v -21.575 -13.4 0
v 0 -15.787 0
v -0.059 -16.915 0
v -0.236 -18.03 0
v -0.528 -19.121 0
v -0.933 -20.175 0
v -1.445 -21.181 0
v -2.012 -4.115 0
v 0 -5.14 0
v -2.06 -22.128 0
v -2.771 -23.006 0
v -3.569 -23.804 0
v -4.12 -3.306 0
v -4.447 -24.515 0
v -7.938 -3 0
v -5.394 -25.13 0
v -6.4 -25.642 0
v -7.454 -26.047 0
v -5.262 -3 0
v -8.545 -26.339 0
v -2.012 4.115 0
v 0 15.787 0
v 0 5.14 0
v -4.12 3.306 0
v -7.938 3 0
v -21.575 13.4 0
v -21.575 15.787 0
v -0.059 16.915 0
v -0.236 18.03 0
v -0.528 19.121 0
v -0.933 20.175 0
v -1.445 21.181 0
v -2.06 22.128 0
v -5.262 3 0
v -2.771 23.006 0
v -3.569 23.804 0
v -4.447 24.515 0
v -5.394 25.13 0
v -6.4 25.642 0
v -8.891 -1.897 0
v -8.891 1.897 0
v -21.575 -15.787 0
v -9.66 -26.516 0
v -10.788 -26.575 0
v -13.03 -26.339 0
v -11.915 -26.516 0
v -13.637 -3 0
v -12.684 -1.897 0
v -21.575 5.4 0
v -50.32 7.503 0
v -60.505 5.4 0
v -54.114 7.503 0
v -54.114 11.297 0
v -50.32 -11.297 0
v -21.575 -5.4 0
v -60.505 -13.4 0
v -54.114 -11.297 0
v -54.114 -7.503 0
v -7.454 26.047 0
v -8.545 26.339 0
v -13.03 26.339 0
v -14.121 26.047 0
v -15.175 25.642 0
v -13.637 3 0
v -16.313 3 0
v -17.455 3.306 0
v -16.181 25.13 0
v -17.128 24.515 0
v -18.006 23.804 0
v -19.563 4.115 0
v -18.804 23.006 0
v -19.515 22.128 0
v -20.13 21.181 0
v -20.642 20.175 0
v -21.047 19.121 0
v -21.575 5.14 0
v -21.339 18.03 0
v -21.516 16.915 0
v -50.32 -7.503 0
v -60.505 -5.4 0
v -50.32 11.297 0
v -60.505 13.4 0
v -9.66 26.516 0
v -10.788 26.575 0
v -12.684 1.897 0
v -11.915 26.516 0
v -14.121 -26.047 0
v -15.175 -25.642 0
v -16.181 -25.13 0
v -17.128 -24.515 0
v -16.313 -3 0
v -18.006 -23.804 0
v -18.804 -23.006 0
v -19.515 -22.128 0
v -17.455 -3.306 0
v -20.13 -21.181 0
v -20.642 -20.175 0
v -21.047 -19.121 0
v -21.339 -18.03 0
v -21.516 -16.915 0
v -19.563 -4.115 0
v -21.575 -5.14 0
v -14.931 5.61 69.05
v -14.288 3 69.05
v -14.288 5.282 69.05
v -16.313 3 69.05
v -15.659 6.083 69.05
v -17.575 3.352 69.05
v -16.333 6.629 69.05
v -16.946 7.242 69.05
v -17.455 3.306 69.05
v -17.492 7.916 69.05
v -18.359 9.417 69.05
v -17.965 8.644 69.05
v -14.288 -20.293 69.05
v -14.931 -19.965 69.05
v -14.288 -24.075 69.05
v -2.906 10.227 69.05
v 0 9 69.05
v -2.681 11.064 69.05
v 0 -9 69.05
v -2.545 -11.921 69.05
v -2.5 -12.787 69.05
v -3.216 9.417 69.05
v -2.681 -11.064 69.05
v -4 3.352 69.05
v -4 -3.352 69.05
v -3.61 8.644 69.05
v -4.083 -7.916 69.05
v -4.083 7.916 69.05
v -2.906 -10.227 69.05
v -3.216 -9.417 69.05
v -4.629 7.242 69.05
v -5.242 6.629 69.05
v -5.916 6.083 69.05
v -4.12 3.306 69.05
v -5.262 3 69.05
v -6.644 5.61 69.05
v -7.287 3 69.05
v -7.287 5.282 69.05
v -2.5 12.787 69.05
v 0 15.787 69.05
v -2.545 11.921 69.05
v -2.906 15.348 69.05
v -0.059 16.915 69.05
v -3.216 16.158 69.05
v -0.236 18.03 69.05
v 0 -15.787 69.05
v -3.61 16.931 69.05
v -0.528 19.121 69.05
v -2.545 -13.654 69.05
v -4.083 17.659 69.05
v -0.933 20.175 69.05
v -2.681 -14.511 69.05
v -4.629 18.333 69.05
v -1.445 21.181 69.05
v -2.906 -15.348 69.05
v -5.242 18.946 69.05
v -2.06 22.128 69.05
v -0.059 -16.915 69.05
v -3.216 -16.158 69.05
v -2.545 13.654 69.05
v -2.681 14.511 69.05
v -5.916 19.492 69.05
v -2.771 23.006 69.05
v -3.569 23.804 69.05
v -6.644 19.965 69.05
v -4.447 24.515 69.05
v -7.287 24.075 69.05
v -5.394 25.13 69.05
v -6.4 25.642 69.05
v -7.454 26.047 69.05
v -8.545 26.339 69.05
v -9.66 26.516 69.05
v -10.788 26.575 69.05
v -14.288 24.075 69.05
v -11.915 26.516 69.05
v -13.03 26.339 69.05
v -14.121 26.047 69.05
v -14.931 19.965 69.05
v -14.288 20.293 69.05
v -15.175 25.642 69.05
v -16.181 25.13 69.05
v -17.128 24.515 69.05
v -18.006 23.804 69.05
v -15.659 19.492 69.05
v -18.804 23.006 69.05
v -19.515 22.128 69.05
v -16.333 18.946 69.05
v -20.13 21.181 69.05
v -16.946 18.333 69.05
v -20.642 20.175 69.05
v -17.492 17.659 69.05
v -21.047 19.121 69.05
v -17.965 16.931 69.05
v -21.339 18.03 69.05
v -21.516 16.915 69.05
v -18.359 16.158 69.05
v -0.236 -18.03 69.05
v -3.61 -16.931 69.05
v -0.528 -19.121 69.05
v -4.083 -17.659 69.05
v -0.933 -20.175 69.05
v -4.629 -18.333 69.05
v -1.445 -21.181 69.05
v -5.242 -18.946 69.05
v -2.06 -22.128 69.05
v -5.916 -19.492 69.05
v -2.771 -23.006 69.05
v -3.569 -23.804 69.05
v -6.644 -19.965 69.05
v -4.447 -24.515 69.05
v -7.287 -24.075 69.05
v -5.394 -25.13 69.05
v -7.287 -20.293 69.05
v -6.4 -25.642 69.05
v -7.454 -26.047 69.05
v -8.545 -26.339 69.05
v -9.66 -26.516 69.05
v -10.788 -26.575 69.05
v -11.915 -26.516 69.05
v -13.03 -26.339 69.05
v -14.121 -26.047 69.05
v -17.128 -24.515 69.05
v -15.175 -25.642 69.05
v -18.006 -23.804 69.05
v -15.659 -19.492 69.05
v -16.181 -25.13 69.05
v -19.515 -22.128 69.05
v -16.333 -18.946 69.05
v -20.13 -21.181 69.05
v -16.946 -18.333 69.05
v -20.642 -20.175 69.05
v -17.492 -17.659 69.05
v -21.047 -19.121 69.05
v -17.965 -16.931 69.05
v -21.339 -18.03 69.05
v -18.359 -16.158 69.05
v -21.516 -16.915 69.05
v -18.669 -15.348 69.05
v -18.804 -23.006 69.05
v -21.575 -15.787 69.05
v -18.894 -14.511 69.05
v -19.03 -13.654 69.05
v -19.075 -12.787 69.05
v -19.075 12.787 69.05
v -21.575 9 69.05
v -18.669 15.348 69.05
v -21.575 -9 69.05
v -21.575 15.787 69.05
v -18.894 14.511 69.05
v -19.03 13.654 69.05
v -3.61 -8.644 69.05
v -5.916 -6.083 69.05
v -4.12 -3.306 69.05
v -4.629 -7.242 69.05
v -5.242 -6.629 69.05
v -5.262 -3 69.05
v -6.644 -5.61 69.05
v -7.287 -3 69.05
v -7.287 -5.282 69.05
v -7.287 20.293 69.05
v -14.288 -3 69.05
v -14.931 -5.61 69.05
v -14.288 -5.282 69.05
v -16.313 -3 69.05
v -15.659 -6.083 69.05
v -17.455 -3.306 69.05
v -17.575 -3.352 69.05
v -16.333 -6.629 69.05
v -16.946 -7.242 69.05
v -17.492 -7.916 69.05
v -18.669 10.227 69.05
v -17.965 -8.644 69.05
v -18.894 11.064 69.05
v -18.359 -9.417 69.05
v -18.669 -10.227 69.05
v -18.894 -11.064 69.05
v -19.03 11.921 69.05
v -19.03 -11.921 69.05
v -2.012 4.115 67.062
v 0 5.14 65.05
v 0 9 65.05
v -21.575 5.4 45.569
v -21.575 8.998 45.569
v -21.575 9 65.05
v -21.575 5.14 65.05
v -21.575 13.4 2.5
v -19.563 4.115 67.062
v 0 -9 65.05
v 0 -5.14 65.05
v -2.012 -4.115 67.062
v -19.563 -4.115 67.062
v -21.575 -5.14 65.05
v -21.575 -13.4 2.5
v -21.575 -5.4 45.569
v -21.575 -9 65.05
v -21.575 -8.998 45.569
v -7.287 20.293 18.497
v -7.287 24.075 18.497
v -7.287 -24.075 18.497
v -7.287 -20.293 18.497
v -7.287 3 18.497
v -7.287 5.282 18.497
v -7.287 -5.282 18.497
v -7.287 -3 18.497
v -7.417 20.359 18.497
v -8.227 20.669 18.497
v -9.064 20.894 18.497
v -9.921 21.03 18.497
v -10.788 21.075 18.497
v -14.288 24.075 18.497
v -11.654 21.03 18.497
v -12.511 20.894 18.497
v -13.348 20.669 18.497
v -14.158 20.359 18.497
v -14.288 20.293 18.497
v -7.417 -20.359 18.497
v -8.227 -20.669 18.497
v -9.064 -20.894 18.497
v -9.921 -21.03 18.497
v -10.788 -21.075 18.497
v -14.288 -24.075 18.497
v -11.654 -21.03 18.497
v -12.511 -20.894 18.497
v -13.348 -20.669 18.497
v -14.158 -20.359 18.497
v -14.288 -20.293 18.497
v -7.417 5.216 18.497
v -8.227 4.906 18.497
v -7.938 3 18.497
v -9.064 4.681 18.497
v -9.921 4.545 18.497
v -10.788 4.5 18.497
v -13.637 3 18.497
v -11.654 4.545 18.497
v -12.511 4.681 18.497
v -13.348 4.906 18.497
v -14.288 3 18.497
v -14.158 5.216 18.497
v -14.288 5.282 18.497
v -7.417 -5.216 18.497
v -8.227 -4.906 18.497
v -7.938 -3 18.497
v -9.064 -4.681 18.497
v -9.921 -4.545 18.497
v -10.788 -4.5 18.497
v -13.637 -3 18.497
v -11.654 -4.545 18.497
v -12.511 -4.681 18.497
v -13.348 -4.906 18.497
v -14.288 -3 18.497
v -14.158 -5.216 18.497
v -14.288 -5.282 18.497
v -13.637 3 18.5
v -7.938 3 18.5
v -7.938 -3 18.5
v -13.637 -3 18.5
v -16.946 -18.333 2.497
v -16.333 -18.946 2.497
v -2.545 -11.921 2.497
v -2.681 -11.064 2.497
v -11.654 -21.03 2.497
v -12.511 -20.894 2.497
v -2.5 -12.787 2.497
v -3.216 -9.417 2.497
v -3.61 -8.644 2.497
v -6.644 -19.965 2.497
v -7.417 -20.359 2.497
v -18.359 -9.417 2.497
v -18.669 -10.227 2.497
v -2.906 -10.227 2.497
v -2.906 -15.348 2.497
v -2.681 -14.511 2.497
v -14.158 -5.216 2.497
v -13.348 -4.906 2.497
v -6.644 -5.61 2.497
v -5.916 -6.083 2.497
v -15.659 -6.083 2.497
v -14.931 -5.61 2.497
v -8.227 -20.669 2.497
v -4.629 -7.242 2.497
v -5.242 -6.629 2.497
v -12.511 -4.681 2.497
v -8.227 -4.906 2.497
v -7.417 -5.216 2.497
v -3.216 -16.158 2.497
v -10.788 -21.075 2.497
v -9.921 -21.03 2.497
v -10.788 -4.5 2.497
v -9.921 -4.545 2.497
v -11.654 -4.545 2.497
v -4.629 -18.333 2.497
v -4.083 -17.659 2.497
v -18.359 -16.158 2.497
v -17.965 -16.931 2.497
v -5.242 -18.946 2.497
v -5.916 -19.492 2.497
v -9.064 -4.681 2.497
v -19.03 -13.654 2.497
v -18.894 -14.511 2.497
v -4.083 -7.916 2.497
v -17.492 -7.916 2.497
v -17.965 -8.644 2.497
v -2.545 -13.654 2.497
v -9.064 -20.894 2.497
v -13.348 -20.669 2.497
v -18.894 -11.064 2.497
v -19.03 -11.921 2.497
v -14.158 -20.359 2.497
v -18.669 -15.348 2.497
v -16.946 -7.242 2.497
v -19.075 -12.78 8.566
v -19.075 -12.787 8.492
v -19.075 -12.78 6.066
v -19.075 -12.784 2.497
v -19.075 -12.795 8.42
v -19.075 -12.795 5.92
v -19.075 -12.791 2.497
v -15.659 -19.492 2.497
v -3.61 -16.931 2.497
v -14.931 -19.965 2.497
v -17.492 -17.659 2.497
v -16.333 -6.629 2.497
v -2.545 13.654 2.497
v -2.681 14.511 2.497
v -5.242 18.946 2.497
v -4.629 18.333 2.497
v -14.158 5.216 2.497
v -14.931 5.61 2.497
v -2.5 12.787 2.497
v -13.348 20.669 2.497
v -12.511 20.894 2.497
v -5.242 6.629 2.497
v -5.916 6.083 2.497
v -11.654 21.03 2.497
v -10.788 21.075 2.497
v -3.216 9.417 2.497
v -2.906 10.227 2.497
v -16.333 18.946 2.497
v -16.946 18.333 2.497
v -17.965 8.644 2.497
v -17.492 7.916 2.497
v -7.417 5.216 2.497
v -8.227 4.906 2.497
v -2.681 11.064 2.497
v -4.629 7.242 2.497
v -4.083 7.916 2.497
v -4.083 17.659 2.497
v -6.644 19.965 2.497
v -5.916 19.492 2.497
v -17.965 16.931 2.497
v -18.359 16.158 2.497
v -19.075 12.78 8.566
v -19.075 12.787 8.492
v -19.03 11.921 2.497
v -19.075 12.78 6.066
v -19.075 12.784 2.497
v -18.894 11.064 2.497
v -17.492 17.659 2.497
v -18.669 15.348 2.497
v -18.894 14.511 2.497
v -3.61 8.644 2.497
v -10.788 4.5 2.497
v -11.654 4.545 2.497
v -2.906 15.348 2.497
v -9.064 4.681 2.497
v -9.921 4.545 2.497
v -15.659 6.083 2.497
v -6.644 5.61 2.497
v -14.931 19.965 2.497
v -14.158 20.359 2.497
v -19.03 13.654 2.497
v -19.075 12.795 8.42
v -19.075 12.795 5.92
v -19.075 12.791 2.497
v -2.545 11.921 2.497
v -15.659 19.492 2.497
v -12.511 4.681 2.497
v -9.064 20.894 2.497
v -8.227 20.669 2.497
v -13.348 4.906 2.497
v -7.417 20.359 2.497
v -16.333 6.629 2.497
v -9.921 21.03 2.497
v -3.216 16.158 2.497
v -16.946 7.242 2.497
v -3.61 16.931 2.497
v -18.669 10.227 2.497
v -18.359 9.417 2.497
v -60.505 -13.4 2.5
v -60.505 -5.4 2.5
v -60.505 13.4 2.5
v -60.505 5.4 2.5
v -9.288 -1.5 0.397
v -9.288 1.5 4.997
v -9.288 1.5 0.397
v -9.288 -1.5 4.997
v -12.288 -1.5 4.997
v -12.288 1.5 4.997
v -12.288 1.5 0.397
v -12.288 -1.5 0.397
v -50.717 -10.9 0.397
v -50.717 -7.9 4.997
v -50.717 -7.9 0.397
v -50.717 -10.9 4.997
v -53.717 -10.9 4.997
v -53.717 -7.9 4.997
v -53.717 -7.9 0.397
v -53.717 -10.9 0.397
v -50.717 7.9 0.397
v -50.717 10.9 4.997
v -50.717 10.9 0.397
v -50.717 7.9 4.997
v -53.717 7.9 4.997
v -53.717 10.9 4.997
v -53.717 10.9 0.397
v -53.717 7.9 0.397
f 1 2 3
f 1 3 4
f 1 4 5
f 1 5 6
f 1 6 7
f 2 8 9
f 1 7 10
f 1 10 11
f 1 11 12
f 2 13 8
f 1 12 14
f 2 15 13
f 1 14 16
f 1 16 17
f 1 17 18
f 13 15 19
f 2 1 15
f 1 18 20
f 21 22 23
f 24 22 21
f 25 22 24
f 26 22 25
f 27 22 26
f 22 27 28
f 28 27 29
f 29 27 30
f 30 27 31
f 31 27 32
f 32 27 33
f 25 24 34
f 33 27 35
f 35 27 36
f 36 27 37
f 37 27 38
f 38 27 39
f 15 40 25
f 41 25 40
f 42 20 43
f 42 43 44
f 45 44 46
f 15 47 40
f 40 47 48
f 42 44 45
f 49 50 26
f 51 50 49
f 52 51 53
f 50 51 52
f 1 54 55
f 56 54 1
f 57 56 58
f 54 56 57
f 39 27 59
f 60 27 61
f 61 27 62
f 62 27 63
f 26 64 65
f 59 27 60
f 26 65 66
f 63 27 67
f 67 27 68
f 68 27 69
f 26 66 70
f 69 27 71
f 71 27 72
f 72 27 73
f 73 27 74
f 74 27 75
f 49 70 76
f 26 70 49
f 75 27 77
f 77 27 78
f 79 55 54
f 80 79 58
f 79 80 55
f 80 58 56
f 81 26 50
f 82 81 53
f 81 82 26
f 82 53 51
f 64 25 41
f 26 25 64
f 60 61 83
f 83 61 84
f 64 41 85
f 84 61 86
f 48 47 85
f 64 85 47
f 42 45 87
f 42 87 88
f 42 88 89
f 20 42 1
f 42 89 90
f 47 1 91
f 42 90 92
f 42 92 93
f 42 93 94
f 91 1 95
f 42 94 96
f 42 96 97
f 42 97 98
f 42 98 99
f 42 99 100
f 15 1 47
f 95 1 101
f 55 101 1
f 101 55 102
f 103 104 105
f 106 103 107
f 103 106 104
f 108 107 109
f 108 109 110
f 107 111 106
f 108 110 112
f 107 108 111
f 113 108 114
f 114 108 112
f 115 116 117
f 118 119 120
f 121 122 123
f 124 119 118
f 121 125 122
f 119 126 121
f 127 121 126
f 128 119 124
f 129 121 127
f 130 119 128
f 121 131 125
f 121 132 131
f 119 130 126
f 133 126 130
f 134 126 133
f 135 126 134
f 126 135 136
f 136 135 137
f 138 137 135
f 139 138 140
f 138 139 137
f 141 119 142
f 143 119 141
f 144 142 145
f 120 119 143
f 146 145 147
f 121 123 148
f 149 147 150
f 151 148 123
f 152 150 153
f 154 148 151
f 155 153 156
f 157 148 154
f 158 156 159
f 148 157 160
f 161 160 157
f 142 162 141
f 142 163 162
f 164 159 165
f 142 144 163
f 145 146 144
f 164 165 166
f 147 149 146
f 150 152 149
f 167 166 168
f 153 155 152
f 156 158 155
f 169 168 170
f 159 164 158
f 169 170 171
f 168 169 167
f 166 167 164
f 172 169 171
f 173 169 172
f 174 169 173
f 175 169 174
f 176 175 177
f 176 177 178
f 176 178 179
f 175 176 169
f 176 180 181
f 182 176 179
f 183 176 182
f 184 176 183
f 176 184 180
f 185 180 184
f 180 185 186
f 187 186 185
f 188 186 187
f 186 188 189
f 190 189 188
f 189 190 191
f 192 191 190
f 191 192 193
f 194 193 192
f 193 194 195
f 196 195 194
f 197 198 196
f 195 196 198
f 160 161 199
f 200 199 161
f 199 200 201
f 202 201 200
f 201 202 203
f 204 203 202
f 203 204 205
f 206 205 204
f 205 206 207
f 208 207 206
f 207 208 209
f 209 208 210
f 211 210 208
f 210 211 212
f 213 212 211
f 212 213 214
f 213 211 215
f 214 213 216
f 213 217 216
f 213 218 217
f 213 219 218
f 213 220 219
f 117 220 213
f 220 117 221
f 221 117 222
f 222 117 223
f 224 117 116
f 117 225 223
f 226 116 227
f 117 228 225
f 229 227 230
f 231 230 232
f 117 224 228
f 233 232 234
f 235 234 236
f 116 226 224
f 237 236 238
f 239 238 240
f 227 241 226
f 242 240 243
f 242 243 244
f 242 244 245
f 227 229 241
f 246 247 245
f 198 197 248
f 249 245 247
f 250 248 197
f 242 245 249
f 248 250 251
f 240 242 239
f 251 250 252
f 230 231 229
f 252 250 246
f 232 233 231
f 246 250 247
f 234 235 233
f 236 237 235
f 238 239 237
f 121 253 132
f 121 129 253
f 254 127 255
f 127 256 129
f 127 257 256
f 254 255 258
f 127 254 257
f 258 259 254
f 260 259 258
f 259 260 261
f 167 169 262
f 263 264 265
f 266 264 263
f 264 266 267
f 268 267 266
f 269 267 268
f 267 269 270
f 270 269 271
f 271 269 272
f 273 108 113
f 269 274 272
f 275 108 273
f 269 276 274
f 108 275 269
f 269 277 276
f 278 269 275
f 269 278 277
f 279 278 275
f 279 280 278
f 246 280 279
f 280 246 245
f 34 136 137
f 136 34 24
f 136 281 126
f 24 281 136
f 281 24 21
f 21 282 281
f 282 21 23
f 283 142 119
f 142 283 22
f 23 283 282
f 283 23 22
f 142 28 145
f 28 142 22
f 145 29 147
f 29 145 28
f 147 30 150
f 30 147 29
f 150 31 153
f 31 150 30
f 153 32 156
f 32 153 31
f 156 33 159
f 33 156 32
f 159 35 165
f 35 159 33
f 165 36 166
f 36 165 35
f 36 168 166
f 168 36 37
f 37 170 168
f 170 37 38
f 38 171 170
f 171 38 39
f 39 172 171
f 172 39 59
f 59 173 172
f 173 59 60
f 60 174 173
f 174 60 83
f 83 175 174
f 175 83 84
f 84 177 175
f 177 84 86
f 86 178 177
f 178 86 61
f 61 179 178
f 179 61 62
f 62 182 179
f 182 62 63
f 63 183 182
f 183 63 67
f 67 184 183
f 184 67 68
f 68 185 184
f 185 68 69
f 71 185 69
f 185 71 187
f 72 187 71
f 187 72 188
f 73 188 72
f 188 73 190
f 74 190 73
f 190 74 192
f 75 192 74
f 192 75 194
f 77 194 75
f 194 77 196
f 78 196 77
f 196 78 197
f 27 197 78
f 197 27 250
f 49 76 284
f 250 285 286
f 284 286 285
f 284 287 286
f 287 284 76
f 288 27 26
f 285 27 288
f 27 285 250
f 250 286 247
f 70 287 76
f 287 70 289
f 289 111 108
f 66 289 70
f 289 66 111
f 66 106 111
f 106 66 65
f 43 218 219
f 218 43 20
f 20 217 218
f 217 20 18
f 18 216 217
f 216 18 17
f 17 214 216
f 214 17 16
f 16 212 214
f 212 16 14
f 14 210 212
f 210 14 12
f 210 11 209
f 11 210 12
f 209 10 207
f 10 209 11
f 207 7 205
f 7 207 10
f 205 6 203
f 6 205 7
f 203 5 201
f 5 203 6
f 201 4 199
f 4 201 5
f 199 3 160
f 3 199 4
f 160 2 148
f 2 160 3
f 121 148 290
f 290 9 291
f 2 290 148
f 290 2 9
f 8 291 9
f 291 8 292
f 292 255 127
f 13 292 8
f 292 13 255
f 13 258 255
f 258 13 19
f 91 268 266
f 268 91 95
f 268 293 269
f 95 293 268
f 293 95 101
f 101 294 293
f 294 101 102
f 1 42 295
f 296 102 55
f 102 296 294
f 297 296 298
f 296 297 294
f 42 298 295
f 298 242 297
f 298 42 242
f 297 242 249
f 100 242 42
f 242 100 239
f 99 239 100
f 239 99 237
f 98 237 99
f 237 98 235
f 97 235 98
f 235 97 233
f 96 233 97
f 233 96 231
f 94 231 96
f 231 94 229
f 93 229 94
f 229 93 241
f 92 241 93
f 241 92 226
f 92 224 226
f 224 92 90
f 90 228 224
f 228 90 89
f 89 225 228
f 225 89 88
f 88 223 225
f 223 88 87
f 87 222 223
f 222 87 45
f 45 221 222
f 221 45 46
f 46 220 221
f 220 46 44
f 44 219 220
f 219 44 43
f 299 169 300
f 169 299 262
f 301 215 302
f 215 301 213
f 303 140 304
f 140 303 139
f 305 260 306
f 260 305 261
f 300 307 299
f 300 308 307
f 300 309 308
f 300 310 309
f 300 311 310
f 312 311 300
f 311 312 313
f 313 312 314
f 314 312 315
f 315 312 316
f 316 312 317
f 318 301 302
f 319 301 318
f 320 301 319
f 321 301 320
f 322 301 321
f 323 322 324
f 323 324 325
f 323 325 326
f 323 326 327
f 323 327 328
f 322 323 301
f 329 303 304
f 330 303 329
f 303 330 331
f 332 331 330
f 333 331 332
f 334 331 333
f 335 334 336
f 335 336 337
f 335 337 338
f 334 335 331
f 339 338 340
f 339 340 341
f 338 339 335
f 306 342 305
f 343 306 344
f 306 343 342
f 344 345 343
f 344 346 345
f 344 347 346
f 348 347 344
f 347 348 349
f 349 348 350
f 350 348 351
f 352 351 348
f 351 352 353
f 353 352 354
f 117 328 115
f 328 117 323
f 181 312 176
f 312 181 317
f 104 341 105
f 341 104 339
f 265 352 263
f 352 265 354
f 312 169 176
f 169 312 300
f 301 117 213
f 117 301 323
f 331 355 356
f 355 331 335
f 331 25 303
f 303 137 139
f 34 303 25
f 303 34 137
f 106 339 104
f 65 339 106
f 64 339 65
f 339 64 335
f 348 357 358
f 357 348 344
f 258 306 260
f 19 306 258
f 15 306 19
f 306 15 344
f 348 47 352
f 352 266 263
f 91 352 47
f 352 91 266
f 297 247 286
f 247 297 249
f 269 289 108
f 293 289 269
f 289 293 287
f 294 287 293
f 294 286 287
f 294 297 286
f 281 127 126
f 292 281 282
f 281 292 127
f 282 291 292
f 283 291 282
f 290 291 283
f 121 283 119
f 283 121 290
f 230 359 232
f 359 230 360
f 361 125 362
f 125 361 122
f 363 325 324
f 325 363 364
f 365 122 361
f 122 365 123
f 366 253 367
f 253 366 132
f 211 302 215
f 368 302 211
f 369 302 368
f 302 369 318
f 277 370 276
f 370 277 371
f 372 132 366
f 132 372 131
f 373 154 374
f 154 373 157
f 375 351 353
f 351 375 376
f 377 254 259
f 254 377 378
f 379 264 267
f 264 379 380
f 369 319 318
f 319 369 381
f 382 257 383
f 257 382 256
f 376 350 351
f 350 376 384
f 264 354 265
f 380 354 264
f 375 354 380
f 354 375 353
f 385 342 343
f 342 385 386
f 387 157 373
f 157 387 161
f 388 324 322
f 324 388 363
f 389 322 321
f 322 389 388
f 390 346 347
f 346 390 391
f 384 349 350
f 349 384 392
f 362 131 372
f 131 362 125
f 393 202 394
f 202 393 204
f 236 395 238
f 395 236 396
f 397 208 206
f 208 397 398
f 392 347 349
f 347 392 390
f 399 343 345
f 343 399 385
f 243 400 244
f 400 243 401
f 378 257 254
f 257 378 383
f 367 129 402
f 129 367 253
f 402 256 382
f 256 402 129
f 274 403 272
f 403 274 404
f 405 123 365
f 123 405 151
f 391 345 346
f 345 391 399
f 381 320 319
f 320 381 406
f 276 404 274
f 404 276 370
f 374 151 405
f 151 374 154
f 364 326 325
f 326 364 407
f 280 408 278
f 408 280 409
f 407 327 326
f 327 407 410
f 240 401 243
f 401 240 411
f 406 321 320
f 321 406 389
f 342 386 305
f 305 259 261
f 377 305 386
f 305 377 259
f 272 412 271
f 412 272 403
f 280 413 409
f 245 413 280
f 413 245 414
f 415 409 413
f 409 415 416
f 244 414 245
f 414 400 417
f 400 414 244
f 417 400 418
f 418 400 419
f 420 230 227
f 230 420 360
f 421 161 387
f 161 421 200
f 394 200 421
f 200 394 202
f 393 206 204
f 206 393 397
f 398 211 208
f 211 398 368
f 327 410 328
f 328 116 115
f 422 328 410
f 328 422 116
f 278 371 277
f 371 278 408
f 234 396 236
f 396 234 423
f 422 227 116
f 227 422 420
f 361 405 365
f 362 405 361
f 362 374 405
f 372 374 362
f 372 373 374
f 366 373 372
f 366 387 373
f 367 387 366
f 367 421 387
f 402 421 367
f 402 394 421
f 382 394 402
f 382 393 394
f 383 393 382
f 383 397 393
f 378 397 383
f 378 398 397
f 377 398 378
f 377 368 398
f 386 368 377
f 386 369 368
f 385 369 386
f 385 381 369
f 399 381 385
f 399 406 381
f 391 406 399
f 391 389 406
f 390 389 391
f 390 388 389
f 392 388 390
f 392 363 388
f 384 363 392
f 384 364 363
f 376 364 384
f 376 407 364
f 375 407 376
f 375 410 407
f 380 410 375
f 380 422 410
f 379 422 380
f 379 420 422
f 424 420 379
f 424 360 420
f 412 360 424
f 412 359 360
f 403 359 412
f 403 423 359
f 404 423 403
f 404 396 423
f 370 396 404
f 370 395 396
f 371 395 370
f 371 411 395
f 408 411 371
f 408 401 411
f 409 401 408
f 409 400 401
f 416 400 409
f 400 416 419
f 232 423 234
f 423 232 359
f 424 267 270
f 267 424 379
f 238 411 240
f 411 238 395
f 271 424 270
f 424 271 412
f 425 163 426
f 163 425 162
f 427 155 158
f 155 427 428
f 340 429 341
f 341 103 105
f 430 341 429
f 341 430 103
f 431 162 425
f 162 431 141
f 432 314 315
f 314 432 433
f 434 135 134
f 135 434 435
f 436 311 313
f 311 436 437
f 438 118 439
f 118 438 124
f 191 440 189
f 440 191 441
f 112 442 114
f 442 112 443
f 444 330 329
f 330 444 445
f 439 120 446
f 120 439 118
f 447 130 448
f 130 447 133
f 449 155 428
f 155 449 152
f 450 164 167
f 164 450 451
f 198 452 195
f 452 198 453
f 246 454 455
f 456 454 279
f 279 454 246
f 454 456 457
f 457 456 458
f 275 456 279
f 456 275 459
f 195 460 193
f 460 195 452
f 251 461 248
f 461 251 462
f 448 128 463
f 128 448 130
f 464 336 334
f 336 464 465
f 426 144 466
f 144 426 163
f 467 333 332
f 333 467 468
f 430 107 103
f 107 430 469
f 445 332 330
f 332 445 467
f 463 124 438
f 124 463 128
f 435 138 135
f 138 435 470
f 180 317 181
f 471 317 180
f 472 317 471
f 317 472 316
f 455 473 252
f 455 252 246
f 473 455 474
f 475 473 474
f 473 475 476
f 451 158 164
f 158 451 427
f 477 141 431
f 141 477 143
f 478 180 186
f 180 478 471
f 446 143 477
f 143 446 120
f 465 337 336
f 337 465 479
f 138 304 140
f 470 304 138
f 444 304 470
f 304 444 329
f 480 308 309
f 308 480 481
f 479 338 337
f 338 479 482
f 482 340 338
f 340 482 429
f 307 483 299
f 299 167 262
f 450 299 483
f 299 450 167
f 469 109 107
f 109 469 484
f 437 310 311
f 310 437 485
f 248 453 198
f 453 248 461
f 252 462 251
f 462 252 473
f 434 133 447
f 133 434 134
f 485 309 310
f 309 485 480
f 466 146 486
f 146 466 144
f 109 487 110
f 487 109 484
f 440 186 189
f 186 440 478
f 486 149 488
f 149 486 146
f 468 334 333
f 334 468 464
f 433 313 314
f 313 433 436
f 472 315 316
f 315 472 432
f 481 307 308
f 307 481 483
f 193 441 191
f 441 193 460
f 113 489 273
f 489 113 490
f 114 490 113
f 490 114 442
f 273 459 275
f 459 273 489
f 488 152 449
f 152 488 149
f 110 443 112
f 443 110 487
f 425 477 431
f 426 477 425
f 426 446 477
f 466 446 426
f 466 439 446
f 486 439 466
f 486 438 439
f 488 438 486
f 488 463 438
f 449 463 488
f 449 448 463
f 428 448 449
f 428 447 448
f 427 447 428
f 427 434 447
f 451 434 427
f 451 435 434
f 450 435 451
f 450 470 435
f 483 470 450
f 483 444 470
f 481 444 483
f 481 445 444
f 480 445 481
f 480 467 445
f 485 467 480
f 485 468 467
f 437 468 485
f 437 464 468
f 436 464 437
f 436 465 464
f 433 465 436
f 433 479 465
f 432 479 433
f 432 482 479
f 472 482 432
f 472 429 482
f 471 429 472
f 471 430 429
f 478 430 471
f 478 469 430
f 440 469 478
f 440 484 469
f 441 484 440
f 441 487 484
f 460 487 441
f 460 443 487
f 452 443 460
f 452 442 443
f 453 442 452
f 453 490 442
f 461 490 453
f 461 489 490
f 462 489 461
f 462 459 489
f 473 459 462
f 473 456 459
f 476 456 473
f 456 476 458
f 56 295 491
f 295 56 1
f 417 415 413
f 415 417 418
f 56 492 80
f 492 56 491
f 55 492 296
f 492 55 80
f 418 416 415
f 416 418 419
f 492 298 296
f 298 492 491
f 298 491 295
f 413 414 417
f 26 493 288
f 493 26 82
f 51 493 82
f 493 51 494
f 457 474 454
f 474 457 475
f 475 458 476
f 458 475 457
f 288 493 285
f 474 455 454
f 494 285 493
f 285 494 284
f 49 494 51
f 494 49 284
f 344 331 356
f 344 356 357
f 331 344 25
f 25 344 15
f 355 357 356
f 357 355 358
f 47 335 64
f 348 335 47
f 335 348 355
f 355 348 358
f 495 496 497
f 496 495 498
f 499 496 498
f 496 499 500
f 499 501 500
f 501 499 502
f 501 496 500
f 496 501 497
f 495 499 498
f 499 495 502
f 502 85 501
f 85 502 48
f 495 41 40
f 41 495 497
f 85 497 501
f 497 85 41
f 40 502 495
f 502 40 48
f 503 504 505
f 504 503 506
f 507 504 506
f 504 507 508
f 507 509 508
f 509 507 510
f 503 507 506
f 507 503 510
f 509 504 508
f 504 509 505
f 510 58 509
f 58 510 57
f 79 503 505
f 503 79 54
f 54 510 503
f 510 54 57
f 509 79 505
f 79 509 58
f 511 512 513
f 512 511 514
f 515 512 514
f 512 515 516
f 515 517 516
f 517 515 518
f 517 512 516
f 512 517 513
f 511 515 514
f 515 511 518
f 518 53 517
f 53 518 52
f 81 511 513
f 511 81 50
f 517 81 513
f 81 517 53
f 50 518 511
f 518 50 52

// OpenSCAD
// file: ../morph.scad
// Utilities for composing smooth solids from a list of cross-sections.

// Searches over a list of key/value pairs (sorted by key), returning
// the index of the pair with the largest key less than or equal to 'target'.
function _binsearch(target, pairs) = (
  _binsearch_impl(target, pairs, 0, len(pairs))
);
function _binsearch_impl(target, pairs, lo, hi) = (
  // Base case.
  hi == lo + 1 ? lo :
  // Recursive case.
  let (mid = floor((hi + lo) / 2))
  pairs[mid][0] <= target
  ? _binsearch_impl(target, pairs, mid, hi)
  : _binsearch_impl(target, pairs, lo, mid)
);

// Filters out slices which do not affect the resulting solid.
function _filter(slices) = (
  assert(len(slices) > 0, "No slices")
  let (last = len(slices)-1)
  [
    for (i = [0 : last]) if (
      // Always keep the start and end.
      i == 0 ||
      i == last ||
      // Keep interior slices only if they are not bordered on both sides by
      // identical slices.
      slices[i-1][1] != slices[i][1] ||
      slices[i+1][1] != slices[i][1]
    ) slices[i]
  ]
);
  
// Each element of 'slices' is a pair giving a Z-coordinate and a payload
// list of values. The result is a similar list with Z-coordinates spaced
// apart by $zstep and the payload values interpolated.
function _reslice(slices) = (
  assert(len(slices) > 0, "No slices")
  let (
    last = len(slices)-1,
    minz = slices[0][0],
    maxz = slices[last][0]
  )
  [
    for (z = [minz : $zstep : maxz]) (
      // Edge cases: No interpolation.
      z == minz ? [z, slices[0][1]] :
      z == maxz ? [z, slices[last][1]] :
    
      // Load the two bounding points between which to interpolate.
      let (
        lo = _binsearch(z, slices),
    
        lower_z = slices[lo][0],
        lower_payload = slices[lo][1],
        upper_z = slices[lo+1][0],
        upper_payload = slices[lo+1][1],
    
        // Interpolation ratio.
        r = (z - lower_z) / (upper_z - lower_z)
      )
      [z, upper_payload*r + lower_payload*(1-r)]
    )
  ]
);

// Interpolates between several slices in the z dimension. Each element of
// 'slices' is a pair giving a Z-coordinate and a payload list of values.
// $zstep determines the resolution. The children are expected to be 2-D.
// They are evaluated repeatedly to produces the slices of the morphed
// solid. Each time the children are evaluated, $m will contain an interpolated
// slice.
module morph(slices) {
  layers = _filter(_reslice(slices));
    
  // We intentionally throw out the last slice. Otherwise we would extrude
  // one zstep beyond the desired dimensions.
  last = len(layers)-2;
  
  for (i = [0 : last]) {
    z = layers[i][0];
    height = layers[i+1][0] - z;
    translate([0, 0, z]) {
      // Add 1% to make sure all of the layers actually overlap.
      linear_extrude(height * 1.01) {
        $m = layers[i][1];
        children();
      }
    }
  }
}

// A utility for generating slices to be passed to morph. This allows the
// z-coordinate to be used as one of the interpolated elements.
function dupfirst(slices) = [
  for (s = slices) [s[0], s]
];
// file: ../grip.scad
use <morph.scad>

module grip() {
  height = 94;
  
  difference() {
    translate([0, 13, 1-height]) {
      // Fields:
      //   height
      //   front circle radius
      //   back circle radius
      //   back circle offset
      morph(dupfirst([
        // Round out the back corner.
        [0,   13,  -4],
        [3,   13,  -2.5],
        [6,   13,  -2],
        [9,   13,  -1.5],
        // Swell out in back.
        [11,  13,  -1],
        [23,  14,  0],
        [41,  14,  0],
        [57,  12, -1],
        // Divot in back for thumb and finger.
        [62,  12, -2.5],
        [67,  12, -4],
        [72,  12, -5],
        [77,  12, -5],
        [79.5,12, -4],
        [82,  12, -2],
        [84.5,12,  1],
        [87,  12,  5],
        [91,  11,  14],
        [94,  11,  15],
      ])) {
        hull() {
          z = $m[0];
          forward =
            // No tilt up to 8mm. Slight tilt from there to 13mm.
            max(0, z-8)*0.2 +
            // Full 18 degree tilt after 13mm.
            max(0, z-13)*0.133333 -
            // No tilt for top 1mm, which joins to receiver
            max(0, z-93)*0.333333;
          
          // Bottom, chamfered in slightly.
          inset = max(0, 1-z);

          translate([0, forward, 0]) {
            translate([0, 16, 0]) circle(12-inset);
            translate([0, -14-$m[2], 0]) circle($m[1]-inset);
          }
        }
      }
    }
  
    // Divots for thumb and index finger.
    for (a = [-1, 1])
      scale([a, 1, 1])
        translate([-22, 52, -15])
          scale([1, 3, 1])
            sphere(12);
  }
}

grip();
// file: common.scad
$fa = 6;
$fs = 0.2;
eps = 0.003;

// Use a larger value for faster rendering.
$zstep = 0.2;

// An inward chamfer sufficient to prevent elephant's foot.
foot = 0.4;

// FINDINGS FROM CLEARANCE TEST
//
// Consider a vertical hole of width X, a layer height of 0.2, and a vertical
// post.
//   * A post of diameter X will not fit in.
//   * A post of diameter X-0.1 will fit in, but is very hard to slide in or out.
//     This is probably due mostly to the transverse grain of the print.
//     It will rotate, but with some resistance.
//   * A post of diameter X-0.2 slides in and out easily. It rotates easily, but
//     still has noticeable resistance at some points.
//   * A post of diameter X-0.3 rotates freely. It also has noticeable play
//     from side to side.
//
// Clearances are expressed as the total across both sides of a joint.
tight = 0.1;  // Intended for stationary joints.
snug = 0.2;   // Moves, but with some resistance.
loose = 0.3;  // Free movement.
extra_loose = 0.4;

// A brim is a 0.2mm layer printed near an edge which is likely to warp.
// The edge should be chamfered outwards at 45 degrees. The brim should
// be placed this far from the bottom of the edge, so it barely touches
// the chamfer.
brim_offset = 0.3;

// Menards 5/8 x 2-3/4 x 0.04 WG compression spring.
spring_od = 5/8 * 25.4;
// Subtract 10 from the relaxed length so everything is slightly tensioned
// all the time.
spring_max_length = 2.75 * 25.4 - 10;
spring_min_length = 16;  // Approximate.

// Menards 1/4 inch aluminum rod.
roller_diameter = 6.7;
roller_cavity_diameter = roller_diameter + loose;

// 550 paracord.
string_diameter = 4;

// Standard spring tube.
tube_id = spring_od + 0.7;

module octagon(diameter) {
  intersection_for(a = [0, 45])
    rotate([0, 0, a])
      square(diameter, center=true);
}

// A cylinder with a chamfered or flared bottom end, useful for dealing
// with elephant's foot on pins or holes.
module flare_cylinder(height, radius, flare) {
  translate([0, 0, abs(flare)-eps])
    cylinder(height-abs(flare)+eps, radius, radius);

  linear_extrude(abs(flare), scale=radius/(radius-flare))
    circle(radius-flare);
}

// A cube with a chamfered or flared bottom end, useful for dealing
// with elephant's foot on pins or holes.
module flare_cube(dims, flare) {
  translate([0, 0, abs(flare)-eps])
    cube([dims.x, dims.y, dims.z - abs(flare) + eps]);

  translate([dims.x/2, dims.y/2, 0])
    linear_extrude(abs(flare), scale=[dims.x/(dims.x-2*flare), dims.y/(dims.y-2*flare)])
      translate([-(dims.x-2*flare)/2, -(dims.y-2*flare)/2, abs(flare)-eps])
        square([dims.x-2*flare, dims.y-2*flare]);
}

// An approximate circle which can be printed on its side.
module circle_ish(r) {
  // Safe overhang angle.
  q = 45;
  
  intersection() {
    // Add 0.2 (one print layer) in case the bridge is messy and hangs
    // down.
    square(2*r+0.2, center=true);
    hull() {
      circle(r);
      for (a = [-1, 1])
        translate([0, a*r/cos(q), 0])
          square(eps, center=true);
    }
  }
}

// Depth of the sockets used as glue aids.
socket_depth = 5;

module socket() {
  translate([-1.5, -1.5, -eps])
    flare_cube([3, 3, socket_depth], -foot);
}

module lug() {
  flare_cube([3-snug, 3-snug, 2*socket_depth-2], foot);
}

// Nerf darts are 0.50 cal.
dart_diameter = 12.7;
dart_length = 72;
// main file
include <common.scad>
use <../grip.scad>

tube_wall = 2.5;

// Diameter of the gap through which the spring passes over the roller.
string_cavity_diameter = string_diameter + 2;

// Gap between the inner edges of the two tubes. Adding 3 here ensures
// each roller bearing rail is 1.5-2mm across.
tube_gap = string_cavity_diameter + 3;

// Add 5 so that the roller also intrudes into a slot on each end.
roller_length = 2*tube_id + tube_gap + 5;

// Add 1 for extra clearance.
roller_cavity_length = roller_length + 1;

// The short dimension of the limb.
limb_exterior_length = tube_id + 2*tube_wall;

// The dimension across the two tubes.
limb_exterior_width = roller_cavity_length + 2*tube_wall;

// Bases of tubes.
base_thickness = 2.5;

// Allow the roller to fit flush into the cavities.
tube_height = spring_max_length + roller_diameter + base_thickness;

brace_length = tube_height * 0.6;
brace_offset = tube_gap * 0.6;
brace_width = 8;

module limb_exterior_2d() {
  intersection() {
    hull()
      for (a = [-1, 1])
        translate([0, a*(limb_exterior_width-limb_exterior_length)/2, 0])
          circle(d=limb_exterior_length);
    
    // Bevel for the incoming string.
    factor = 2;
    for (a = [-1, 1])
      translate([0, a * (limb_exterior_length*factor/2 + tube_gap/4), 0])
        circle(d=limb_exterior_length*factor);
  }
}

module limb() {  
  translate([-limb_exterior_length/2, 0, 0]) {
    difference() {
      union() {
        difference() {
          // Exterior.
          linear_extrude(tube_height)
            limb_exterior_2d();
          
          // Roller cavity.
          translate([-roller_cavity_diameter/2, -roller_cavity_length/2, base_thickness+spring_min_length-eps])
            cube([roller_cavity_diameter, roller_cavity_length, tube_height+2*eps]);
                    
          // String cavity.
          translate([-limb_exterior_length/2-1, -string_cavity_diameter/2, -eps])
            cube([limb_exterior_length+2, string_cavity_diameter, tube_height+2*eps]);
        }
        
        // Connect the tops of the tubes on both sides, for strength.
        for (a = [-1, 1])
          scale([a, 1, 1])
            translate([limb_exterior_length/2, tube_gap, tube_height])
              rotate([90, 180, 0])
                linear_extrude(tube_gap*2)
                  polygon([[0, 0], [4, 0], [0, 4]]);
      }
      
      // Spring cavities.
      for (a = [-1, 1])
        translate([0, a*(tube_id+tube_gap)/2, base_thickness-eps])
          linear_extrude(tube_height+2*eps)
            circle(d=tube_id);
    }
    
    // Connecting block directly underneath the roller. The roller will rest on this
    // when fully charged.
    translate([-(roller_diameter-1)/2, -string_cavity_diameter/2, 0])
      cube([roller_diameter-1, string_cavity_diameter, base_thickness+spring_min_length]);
        
    // Base plates for braces.
    for (a = [-1, 1]) {
      scale([1, a, 1]) {
        translate([0, brace_offset, 0]) {
          hull() {
            translate([tube_wall-brace_length-limb_exterior_length/2, 0, 0])
              cube([brace_length, brace_width, base_thickness]);
            translate([tube_wall-limb_exterior_length/2, 0, tube_height*0.7-base_thickness])
              cube([eps, tube_id*0.2, base_thickness]);
          }
        }
      }
    }
  }
}

module limb_sockets() {
  translate([-limb_exterior_length/2, 0, 0])
    socket();
  for (a = [-1, 1])
    scale([1, a, 1])
      translate([-brace_length-limb_exterior_length/2, brace_offset+brace_width/2, 0])
        socket();
}

module socketed_limb() {
  difference() {
    limb();
    limb_sockets();
  }
}

barrel_length = 200;
barrel_wall = 2;
barrel_width = dart_diameter + 2*barrel_wall;
bore_diameter = dart_diameter + loose;

block_front_offset = 20;

// Blocks to connect barrel and limbs.
block_width = 15;
block_height = 2*brace_width + 2*brace_offset;
block_length = limb_exterior_length + brace_length - tube_wall + block_front_offset;

module barrel() {
  front_offset = tube_wall + tube_id/2 + (roller_diameter-1)/2;
  
  // Main barrel.
  difference() {
    union() {
      translate([0, -barrel_width/2, -block_height/2])
        cube([barrel_length, barrel_width, block_height]);
      
      // Side blocks for attaching limbs.
      for (a = [-1, 1])
        scale([1, a, 1])
          translate([-block_front_offset, barrel_width/2, -block_height/2])
            cube([block_length, block_width, block_height]);
    }
    
    // Slot for string.
    translate([250 + front_offset, 0, 0])
      cube([500, 500, string_cavity_diameter], center=true);
    
    // Cut away the top of the barrel behind the blocks, for easy access.
    translate([block_length-block_front_offset+250, 0, 10-eps])
      cube([500, 500, 20], center=true);
    
    // Bore.
    translate([-eps, 0, 0])
      rotate([0, 90, 0])
        cylinder(barrel_length+2*eps, d=bore_diameter);

    // Chamfer edges exposed to the string.
    factor = 1.1;
    for (a = [-1, 1]) {
      scale([1, a, 1]) {
        translate([block_length/2 + front_offset, block_width + barrel_width/2, 0])
          rotate([45, 0, 0])
            cube([block_length, string_cavity_diameter*factor, string_cavity_diameter*factor], center=true);
        
        difference() {
          translate([block_length-block_front_offset, 0, 0])
            rotate([45, 0, 90])
              cube([block_width*2+barrel_width, string_cavity_diameter*factor, string_cavity_diameter*factor], center=true);
          // Don't leave a notch in the bottom part of the barrel.
          translate([0, 0, -5])
            cube([200, 200, 10], center=true);
        }
      }
    }
    
    // String attachment points in front.
    for (a = [-1, 1]) {
      scale([1, a, 1]) {
        translate([-block_front_offset*0.8-block_width, 0, 0]) {
          rotate([0, 90, 50]) {
            cylinder(100, d=string_diameter+loose);
            cylinder(20, d=2*string_diameter+loose);
          }
        }
      }
    }

    // Attachment sockets for the limbs.
    for (a = [-1, 1])
      scale([1, a, 1])
        translate([0, barrel_width/2+block_width, 0])
          scale([1, -1, 1])
            rotate([90, 0, 180])
              limb_sockets();
  }
    
  // Attach a grip.
  translate([110, 0, -block_height/2])
    rotate([0, 0, 90])
      grip();
}

//barrel();
//for (a = [-1, 1]) scale([1, a, 1]) translate([0, barrel_width/2+block_width, 0]) rotate([90, 0, 180]) limb();
socketed_limb();
//for (a = [1:6]) translate([a*5, 0, 0]) lug();
